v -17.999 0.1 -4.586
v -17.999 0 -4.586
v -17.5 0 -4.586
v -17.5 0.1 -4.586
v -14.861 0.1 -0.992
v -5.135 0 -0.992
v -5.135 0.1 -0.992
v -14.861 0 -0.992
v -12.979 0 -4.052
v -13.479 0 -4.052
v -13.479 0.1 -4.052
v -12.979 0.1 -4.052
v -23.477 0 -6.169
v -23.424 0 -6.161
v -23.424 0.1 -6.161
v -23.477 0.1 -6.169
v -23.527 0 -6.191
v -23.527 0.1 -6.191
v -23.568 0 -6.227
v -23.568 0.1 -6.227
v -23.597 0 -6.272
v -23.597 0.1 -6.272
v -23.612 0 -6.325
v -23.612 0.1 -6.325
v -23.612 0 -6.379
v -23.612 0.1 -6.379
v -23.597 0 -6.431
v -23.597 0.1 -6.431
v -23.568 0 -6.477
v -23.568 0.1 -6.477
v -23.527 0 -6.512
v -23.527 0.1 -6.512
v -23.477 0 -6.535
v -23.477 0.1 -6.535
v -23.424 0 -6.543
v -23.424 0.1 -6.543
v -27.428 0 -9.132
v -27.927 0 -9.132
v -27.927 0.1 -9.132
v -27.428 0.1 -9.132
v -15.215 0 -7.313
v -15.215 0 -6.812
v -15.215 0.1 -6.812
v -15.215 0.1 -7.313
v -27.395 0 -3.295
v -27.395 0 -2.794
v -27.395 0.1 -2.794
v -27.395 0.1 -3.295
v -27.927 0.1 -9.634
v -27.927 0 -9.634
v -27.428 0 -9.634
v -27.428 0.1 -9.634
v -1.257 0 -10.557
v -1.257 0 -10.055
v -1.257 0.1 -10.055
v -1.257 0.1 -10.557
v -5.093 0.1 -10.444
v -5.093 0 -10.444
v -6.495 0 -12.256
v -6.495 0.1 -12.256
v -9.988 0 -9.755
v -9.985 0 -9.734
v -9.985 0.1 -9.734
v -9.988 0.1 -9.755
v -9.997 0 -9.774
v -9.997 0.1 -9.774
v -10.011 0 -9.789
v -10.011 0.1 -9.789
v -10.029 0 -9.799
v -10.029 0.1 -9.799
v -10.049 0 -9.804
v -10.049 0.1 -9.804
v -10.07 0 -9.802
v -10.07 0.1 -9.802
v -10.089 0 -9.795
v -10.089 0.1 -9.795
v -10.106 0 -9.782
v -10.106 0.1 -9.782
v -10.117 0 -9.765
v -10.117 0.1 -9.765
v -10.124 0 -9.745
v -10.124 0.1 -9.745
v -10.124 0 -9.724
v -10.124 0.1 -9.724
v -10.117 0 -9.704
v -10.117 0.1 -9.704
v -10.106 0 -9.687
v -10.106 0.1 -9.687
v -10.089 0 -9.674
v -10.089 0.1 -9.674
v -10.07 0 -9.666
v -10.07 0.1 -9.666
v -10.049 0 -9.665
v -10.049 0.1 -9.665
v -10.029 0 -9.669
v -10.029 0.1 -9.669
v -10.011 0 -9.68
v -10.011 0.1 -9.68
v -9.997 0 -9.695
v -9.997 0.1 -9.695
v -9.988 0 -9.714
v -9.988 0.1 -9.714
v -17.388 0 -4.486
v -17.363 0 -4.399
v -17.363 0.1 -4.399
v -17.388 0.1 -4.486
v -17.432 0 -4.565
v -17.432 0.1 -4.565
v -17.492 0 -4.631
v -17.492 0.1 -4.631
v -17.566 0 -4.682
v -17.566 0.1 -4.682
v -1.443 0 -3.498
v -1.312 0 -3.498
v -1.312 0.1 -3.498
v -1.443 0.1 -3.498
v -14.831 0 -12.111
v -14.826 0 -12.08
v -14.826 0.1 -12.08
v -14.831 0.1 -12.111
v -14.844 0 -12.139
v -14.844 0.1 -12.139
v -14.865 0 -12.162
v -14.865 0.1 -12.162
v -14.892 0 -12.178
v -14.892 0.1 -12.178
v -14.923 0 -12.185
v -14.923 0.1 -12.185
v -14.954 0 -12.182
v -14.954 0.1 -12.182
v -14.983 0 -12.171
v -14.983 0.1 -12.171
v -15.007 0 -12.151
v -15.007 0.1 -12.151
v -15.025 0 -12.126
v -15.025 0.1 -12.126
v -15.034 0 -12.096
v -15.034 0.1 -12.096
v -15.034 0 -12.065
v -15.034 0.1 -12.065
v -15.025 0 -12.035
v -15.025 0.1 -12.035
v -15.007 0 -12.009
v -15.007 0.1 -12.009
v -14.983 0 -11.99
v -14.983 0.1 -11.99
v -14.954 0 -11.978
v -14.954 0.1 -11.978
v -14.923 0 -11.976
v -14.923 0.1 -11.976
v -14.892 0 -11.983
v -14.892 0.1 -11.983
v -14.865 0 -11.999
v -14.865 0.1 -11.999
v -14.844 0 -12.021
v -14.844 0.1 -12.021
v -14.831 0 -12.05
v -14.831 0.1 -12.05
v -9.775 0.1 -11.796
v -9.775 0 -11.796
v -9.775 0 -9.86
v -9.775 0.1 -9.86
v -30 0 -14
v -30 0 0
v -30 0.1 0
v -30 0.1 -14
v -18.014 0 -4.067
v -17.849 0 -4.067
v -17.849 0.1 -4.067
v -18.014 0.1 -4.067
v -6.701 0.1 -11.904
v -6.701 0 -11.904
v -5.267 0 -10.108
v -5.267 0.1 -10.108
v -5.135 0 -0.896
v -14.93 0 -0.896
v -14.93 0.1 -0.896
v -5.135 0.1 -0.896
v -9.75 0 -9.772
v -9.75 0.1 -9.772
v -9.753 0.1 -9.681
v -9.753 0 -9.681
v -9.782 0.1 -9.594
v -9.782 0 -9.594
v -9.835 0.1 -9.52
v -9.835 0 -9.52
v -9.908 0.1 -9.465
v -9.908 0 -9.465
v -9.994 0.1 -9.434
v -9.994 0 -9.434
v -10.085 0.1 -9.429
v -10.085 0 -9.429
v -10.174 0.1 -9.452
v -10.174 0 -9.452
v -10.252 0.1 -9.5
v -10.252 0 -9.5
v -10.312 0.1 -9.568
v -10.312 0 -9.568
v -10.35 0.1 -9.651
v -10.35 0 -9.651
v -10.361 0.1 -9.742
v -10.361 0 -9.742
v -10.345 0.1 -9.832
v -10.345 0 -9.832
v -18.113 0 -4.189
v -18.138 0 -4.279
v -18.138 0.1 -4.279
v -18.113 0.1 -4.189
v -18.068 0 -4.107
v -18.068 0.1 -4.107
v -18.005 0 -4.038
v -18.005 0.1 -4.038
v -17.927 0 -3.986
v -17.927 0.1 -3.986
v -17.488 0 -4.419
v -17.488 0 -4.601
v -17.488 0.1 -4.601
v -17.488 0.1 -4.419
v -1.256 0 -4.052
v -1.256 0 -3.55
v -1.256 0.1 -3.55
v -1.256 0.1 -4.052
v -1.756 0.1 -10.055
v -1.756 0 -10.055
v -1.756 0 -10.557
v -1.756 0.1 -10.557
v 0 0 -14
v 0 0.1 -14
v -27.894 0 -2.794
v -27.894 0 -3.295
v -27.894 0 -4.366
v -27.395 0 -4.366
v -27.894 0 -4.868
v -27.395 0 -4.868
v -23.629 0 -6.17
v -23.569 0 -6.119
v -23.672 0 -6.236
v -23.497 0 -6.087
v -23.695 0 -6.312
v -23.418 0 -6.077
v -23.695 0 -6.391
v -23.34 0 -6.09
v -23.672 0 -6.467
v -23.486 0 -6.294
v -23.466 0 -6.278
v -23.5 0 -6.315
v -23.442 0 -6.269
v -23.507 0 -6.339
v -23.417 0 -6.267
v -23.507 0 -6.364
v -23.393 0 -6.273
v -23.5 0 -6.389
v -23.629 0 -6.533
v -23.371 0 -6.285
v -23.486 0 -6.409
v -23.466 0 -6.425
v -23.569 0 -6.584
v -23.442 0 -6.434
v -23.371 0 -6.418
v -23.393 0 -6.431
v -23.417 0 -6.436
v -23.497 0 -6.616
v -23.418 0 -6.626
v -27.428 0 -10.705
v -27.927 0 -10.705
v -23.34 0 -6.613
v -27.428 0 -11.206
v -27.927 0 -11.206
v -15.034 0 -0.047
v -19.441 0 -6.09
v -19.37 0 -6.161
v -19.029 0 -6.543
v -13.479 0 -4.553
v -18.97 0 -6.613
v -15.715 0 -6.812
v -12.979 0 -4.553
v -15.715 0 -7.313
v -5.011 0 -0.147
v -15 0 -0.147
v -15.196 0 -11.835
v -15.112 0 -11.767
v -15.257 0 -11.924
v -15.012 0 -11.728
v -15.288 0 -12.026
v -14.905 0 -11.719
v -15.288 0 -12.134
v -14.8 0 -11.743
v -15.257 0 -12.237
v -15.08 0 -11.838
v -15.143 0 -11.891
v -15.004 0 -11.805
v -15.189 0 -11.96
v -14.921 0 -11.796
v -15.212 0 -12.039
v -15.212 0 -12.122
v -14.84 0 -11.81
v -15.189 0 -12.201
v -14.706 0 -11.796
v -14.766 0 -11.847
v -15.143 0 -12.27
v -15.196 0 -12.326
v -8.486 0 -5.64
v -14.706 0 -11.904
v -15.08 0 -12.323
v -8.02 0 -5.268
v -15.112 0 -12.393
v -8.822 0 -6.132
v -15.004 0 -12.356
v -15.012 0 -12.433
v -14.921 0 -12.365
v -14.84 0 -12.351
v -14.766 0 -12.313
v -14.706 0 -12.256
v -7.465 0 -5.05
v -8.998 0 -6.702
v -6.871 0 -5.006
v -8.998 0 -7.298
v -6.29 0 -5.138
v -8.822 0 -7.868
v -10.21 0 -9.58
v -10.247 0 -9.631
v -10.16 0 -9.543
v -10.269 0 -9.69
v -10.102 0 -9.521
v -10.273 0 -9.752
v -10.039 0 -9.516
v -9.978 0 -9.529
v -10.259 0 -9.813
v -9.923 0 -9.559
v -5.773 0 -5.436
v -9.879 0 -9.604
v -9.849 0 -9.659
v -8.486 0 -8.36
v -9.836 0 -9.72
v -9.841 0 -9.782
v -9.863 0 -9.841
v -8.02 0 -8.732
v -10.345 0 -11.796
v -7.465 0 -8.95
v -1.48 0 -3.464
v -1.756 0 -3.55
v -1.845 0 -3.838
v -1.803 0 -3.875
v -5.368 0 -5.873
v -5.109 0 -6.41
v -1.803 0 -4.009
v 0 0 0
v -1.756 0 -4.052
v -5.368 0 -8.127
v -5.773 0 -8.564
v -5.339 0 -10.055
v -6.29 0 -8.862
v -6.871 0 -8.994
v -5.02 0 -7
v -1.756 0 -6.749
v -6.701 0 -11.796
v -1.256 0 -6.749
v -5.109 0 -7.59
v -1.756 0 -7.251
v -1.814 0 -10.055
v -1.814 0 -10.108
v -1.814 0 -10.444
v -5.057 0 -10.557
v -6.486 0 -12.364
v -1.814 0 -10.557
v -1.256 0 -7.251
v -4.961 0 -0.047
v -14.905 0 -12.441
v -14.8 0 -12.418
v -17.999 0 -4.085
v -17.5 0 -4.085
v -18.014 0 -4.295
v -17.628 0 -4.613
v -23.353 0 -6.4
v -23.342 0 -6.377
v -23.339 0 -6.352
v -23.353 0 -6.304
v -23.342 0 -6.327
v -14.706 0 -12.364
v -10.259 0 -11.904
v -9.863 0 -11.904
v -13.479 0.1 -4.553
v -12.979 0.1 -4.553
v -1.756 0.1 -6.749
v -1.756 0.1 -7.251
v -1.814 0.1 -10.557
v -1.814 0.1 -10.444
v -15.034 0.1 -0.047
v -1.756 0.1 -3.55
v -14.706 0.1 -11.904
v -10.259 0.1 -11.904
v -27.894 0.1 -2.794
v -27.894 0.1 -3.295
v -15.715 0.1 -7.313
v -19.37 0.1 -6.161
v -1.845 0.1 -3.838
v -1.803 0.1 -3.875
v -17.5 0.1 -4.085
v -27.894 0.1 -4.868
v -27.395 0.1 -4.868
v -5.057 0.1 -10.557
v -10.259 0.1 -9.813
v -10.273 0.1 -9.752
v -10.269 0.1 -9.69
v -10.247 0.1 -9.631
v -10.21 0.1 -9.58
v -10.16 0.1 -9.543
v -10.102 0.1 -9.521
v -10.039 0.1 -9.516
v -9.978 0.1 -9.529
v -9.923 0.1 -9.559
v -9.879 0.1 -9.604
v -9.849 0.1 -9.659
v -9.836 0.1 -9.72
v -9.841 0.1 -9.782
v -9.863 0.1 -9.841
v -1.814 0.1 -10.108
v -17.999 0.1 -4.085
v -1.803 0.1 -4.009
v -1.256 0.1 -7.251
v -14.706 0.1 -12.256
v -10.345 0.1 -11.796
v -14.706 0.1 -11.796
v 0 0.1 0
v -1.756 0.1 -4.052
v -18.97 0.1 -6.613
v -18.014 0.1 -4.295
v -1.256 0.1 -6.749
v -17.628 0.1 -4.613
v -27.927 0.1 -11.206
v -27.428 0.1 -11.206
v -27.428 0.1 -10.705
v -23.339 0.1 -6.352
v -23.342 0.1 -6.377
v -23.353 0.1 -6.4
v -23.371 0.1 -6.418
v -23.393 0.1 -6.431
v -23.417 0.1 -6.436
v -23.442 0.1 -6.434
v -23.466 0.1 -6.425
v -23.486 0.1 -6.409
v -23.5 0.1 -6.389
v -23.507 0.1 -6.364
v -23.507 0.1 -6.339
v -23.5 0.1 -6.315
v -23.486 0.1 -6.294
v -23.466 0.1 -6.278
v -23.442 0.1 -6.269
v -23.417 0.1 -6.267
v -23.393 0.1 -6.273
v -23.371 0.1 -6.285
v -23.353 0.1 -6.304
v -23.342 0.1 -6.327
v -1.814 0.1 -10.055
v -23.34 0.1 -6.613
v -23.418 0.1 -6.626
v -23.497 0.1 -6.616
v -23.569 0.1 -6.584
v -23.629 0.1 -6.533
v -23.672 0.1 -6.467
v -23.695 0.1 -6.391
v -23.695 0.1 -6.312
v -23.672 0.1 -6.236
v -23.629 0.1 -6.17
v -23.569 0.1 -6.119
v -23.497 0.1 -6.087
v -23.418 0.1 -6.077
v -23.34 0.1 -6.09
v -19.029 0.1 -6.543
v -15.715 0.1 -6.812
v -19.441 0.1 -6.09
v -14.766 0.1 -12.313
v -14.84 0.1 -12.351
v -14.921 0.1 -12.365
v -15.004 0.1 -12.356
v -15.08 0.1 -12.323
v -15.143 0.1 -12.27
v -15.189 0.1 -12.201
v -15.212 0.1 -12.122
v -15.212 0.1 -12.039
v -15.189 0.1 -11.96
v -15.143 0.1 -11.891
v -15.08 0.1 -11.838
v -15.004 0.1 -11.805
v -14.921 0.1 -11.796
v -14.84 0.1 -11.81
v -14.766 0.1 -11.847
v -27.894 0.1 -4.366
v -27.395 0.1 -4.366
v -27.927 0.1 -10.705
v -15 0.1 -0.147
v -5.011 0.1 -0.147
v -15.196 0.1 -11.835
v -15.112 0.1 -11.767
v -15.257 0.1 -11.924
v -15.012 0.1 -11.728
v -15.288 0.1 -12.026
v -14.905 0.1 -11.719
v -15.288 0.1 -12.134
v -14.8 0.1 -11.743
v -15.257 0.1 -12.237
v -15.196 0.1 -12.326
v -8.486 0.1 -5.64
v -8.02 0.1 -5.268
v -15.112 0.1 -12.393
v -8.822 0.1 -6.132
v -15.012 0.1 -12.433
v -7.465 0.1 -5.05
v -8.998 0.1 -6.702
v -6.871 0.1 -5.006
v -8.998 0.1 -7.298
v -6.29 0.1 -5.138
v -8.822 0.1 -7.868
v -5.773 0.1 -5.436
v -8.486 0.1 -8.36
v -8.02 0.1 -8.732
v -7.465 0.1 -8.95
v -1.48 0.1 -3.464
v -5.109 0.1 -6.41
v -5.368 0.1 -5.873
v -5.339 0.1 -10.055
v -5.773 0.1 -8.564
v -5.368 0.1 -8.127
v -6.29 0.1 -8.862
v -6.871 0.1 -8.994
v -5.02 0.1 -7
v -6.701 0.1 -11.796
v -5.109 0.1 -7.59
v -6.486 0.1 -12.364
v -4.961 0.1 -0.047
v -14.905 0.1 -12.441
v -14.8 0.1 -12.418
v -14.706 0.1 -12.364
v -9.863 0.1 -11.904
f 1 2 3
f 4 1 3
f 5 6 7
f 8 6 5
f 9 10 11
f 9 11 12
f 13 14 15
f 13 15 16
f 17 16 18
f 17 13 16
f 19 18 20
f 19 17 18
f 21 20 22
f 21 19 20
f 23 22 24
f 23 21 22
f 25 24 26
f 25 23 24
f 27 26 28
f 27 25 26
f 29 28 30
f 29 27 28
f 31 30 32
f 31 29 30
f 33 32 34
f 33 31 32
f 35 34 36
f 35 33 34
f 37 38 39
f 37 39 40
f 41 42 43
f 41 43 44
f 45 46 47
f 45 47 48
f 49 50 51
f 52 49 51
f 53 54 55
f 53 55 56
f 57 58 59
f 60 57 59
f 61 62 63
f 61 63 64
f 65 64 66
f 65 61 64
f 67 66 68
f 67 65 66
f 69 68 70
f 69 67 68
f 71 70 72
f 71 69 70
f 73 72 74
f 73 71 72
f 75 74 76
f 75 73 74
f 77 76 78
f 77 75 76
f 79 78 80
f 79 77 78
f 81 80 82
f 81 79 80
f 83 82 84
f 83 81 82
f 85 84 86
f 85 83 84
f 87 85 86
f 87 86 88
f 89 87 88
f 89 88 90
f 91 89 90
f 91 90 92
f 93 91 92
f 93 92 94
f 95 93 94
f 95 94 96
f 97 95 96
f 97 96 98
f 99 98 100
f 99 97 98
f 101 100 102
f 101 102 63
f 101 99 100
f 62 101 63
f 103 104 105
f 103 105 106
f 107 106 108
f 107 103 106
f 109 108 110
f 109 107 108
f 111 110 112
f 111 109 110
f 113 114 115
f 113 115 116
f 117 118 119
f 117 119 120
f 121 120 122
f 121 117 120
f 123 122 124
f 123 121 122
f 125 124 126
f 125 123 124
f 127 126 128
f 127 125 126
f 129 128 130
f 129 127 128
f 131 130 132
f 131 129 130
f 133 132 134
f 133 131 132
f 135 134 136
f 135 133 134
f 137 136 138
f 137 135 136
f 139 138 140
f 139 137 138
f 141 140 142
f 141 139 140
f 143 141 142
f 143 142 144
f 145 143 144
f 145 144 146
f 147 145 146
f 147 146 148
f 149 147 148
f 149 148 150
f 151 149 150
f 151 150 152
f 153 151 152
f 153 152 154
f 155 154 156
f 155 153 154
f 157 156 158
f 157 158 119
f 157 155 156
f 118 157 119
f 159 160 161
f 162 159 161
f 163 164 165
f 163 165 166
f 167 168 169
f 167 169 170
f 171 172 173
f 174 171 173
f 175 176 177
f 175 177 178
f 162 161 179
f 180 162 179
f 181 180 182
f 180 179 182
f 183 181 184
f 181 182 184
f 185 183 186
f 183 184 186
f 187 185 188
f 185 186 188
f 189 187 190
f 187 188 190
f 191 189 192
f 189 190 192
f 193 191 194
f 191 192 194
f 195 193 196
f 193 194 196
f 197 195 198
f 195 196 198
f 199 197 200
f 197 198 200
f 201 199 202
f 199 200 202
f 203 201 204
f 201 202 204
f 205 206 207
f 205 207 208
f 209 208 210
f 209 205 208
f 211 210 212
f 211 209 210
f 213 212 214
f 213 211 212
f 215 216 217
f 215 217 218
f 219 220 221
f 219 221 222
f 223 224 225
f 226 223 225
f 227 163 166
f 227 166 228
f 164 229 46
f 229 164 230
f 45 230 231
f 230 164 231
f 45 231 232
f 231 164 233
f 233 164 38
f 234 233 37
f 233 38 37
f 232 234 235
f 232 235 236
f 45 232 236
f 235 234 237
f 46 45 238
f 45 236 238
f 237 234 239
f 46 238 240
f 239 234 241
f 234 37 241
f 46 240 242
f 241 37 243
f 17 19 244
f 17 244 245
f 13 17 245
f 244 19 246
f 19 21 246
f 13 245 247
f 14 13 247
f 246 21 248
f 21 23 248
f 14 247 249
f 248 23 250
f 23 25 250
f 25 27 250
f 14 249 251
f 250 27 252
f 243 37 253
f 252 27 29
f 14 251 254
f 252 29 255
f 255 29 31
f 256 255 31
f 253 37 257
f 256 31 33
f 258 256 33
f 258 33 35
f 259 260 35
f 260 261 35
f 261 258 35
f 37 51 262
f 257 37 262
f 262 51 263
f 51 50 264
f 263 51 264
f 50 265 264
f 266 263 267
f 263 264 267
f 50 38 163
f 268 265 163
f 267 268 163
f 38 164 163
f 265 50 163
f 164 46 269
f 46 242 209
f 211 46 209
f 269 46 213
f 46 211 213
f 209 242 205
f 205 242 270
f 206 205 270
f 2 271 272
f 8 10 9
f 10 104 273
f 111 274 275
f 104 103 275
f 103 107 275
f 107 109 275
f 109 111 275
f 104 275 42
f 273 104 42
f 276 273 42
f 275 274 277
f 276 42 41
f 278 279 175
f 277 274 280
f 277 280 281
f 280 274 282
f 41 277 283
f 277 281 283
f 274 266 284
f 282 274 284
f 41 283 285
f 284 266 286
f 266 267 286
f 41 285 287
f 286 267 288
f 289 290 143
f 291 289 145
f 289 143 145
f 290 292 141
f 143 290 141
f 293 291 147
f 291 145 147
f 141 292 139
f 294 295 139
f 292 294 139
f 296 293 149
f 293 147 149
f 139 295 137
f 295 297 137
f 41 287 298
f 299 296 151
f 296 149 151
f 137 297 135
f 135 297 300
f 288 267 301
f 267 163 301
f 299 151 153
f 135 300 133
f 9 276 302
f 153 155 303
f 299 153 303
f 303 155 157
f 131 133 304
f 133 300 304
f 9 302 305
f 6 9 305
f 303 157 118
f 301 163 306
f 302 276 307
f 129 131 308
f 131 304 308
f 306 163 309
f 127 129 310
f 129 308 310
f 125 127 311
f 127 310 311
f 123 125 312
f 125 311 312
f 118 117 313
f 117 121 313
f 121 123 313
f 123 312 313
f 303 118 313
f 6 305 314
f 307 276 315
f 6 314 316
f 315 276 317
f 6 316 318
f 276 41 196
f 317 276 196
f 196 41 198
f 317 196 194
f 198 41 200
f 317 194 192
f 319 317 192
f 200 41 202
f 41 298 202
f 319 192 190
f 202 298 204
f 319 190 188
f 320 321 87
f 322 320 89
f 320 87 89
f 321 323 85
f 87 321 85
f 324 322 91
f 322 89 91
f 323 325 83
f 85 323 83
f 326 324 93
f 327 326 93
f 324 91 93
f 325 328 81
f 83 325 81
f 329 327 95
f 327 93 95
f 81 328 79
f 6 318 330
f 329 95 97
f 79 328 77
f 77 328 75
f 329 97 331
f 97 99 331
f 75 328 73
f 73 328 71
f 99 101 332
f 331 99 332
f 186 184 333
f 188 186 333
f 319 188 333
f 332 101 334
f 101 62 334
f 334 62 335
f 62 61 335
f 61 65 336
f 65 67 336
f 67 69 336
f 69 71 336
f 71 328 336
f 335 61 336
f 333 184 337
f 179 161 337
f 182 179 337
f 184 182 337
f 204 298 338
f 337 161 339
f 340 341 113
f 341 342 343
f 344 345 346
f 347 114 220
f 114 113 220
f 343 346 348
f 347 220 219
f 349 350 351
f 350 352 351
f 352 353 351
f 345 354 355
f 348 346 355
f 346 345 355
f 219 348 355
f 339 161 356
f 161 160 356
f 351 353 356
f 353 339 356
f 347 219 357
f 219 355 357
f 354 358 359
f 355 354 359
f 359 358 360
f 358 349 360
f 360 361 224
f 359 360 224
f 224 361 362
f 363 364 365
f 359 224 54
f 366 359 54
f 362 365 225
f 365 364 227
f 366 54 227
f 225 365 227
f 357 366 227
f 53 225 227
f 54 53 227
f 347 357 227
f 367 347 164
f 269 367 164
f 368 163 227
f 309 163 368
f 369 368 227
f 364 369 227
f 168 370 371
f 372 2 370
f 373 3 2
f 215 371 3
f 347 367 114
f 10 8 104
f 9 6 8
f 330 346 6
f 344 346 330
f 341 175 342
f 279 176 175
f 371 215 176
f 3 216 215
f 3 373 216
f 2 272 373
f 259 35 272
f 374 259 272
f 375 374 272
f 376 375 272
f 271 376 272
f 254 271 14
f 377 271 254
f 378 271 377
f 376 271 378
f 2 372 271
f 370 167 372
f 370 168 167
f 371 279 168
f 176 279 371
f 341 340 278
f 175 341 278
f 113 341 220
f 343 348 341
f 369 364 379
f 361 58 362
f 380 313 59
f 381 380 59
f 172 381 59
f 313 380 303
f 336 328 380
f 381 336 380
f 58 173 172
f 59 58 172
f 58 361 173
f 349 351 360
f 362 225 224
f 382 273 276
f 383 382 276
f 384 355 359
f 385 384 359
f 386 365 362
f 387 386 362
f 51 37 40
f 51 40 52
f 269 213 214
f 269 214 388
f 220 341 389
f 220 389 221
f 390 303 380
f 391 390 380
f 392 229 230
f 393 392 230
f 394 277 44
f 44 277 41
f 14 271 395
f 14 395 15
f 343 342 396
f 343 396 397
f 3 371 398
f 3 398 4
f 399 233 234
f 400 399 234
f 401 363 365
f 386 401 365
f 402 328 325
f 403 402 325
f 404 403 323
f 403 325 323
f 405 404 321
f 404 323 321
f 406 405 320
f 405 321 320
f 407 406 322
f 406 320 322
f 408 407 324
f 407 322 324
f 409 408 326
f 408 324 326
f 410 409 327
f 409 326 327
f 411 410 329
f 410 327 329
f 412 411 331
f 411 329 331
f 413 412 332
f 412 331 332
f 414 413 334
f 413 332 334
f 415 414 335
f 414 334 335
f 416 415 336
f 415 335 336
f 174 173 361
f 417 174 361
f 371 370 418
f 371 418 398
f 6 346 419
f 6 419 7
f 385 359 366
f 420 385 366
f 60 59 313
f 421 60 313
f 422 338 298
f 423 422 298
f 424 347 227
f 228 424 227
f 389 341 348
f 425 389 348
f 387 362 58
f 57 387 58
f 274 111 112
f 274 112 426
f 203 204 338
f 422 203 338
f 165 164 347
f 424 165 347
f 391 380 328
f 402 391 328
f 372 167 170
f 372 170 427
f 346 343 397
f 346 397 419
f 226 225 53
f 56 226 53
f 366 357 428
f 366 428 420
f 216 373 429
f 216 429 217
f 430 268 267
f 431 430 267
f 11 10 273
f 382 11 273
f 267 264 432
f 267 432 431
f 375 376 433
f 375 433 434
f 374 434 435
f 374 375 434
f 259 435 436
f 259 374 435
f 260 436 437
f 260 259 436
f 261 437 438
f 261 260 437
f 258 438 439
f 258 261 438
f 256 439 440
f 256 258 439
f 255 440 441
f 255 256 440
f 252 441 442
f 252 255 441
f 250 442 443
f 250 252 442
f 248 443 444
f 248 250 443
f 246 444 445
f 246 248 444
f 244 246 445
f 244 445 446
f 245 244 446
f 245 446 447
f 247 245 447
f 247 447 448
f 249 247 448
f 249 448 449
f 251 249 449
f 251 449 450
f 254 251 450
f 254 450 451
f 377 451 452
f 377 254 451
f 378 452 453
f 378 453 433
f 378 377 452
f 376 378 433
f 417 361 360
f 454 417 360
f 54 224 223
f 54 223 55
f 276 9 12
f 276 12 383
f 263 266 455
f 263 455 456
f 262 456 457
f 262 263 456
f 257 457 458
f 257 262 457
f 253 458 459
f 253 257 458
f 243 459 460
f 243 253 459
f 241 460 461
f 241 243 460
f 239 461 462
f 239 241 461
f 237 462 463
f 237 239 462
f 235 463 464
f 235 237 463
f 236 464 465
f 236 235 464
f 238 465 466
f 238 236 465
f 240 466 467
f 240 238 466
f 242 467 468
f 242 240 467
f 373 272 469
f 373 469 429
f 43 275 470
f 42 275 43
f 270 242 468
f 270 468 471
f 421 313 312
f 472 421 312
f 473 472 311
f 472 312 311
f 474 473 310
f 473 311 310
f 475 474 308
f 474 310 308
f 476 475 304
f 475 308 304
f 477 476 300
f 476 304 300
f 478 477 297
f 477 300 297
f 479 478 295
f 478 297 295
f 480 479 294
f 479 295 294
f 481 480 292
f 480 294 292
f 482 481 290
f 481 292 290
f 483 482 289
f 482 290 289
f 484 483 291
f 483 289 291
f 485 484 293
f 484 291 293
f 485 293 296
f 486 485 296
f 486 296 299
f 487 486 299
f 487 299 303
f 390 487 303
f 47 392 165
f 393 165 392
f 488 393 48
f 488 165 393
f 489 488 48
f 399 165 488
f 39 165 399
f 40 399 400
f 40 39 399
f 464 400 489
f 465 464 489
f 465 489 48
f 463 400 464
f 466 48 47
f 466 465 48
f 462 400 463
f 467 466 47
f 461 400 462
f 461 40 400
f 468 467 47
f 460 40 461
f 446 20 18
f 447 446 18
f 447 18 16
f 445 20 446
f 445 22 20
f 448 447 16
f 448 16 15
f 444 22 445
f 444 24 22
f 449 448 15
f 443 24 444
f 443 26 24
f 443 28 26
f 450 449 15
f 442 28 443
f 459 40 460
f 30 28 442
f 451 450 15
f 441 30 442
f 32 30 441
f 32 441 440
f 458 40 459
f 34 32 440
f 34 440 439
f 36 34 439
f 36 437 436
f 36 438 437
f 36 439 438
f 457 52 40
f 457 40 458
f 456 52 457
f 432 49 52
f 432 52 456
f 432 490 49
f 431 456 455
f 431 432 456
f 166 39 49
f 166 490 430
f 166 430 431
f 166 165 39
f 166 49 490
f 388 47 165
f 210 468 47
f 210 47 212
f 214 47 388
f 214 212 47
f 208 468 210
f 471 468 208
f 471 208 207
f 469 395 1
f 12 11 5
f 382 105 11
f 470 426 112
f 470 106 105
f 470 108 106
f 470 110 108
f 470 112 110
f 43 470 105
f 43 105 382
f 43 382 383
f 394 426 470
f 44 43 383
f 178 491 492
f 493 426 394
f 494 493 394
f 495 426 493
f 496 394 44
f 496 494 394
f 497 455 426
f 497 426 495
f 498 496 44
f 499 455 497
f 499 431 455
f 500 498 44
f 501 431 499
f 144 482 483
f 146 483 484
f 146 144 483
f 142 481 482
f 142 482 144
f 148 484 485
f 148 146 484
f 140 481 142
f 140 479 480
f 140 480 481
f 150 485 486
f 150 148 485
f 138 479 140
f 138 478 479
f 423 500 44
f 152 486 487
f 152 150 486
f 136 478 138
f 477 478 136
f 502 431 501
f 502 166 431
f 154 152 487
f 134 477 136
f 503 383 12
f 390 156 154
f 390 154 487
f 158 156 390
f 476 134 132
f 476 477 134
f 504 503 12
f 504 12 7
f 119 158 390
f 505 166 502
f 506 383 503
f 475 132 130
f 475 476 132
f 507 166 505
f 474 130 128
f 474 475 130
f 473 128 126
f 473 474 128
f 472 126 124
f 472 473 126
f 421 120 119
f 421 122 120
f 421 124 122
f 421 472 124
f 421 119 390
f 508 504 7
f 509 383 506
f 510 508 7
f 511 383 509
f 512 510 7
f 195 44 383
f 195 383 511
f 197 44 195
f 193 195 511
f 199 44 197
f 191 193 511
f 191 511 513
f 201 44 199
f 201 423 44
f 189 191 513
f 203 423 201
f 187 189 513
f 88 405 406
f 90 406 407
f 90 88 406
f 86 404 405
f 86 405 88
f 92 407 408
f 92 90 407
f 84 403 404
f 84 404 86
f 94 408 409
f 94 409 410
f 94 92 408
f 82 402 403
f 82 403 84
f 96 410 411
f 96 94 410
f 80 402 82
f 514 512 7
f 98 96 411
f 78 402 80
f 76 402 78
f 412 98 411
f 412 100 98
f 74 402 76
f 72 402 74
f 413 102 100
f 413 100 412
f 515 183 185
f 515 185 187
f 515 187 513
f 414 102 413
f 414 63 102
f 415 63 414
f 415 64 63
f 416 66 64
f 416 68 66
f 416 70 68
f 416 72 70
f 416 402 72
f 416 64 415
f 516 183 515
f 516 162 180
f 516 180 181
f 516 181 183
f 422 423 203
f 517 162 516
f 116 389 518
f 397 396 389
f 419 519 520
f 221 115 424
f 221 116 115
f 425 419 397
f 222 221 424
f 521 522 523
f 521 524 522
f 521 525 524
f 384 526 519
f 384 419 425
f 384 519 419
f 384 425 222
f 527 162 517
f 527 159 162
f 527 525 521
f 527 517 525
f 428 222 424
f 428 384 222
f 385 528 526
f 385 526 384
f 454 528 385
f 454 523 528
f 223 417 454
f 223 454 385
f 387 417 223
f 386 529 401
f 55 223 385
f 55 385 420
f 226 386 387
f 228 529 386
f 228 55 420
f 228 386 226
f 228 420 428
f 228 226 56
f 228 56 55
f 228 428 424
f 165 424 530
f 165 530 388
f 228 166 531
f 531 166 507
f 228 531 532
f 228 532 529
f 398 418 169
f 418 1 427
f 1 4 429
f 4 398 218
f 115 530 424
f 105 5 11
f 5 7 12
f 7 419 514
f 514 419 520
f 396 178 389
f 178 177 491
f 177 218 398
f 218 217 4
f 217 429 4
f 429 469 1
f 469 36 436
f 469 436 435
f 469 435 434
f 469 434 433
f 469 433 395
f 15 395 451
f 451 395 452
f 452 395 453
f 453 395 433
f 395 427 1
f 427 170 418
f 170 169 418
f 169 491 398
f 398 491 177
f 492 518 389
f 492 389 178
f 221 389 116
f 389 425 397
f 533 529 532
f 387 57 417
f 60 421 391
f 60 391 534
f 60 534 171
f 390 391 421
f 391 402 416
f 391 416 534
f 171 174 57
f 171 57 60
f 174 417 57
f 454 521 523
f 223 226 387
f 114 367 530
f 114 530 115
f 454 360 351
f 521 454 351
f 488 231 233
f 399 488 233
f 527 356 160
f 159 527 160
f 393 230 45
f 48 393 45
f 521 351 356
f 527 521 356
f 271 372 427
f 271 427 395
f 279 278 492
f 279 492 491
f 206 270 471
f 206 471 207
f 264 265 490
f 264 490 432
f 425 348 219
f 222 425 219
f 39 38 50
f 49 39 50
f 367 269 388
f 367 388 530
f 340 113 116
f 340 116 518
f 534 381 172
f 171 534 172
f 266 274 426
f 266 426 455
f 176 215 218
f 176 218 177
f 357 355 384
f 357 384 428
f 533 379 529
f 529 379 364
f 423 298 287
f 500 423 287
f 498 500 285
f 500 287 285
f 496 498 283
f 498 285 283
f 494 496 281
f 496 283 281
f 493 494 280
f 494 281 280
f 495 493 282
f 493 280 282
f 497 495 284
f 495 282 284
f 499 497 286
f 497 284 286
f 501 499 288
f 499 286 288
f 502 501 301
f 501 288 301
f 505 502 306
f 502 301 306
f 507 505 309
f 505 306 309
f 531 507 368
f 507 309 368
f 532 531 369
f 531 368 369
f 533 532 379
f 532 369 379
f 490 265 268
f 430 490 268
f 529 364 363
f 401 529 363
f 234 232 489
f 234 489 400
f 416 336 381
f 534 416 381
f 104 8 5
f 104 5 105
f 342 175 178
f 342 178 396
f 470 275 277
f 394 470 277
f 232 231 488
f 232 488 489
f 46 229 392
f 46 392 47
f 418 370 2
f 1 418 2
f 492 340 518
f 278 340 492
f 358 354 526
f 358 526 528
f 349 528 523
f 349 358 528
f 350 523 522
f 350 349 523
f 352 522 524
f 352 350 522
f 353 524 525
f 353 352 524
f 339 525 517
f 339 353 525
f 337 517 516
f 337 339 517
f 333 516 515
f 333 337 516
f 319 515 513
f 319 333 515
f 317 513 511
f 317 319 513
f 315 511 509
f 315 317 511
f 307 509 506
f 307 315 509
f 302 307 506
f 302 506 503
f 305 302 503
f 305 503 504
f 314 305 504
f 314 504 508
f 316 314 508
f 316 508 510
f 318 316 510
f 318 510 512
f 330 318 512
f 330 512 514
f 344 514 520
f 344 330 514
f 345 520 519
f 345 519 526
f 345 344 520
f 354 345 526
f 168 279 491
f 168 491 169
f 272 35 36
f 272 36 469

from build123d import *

# Parameters (mm, degrees)
SKETCH1_W           = 30
SKETCH1_H           = 14
SKETCH1_R           = 2
SKETCH1_R_2         = 0.069707308
SKETCH1_R_3         = 0.104510519
SKETCH1_R_4         = 0.084887638
SKETCH1_W_2         = 0.499197809
SKETCH1_H_2         = 0.501456342
SKETCH1_H_3         = 0.501456343
BOSS_EXTRUDE2_DEPTH = 0.1


with BuildPart() as part:
    # Sketch1 → Boss-Extrude2 (new body)
    with BuildSketch(Plane(origin=(0, 0, 0), x_dir=(1, 0, 0), z_dir=(0, 1, 0))):
        with Locations((-15, 7)):
            Rectangle(SKETCH1_W, SKETCH1_H)
        with Locations((-7.020370045, 7)):
            Circle(SKETCH1_R, mode=Mode.SUBTRACT)
        with Locations((-10.054598749, 9.734280097)):
            Circle(SKETCH1_R_2, mode=Mode.SUBTRACT)
        with Locations((-14.930479438, 12.0803142)):
            Circle(SKETCH1_R_3, mode=Mode.SUBTRACT)
        with Locations((-23.42355671, 6.351698017)):
            Circle(SKETCH1_R_4, mode=Mode.SUBTRACT)
        with Locations((-1.506295526, 10.305773891)):
            Rectangle(SKETCH1_W_2, SKETCH1_H_2, mode=Mode.SUBTRACT)
        with Locations((-1.506058557, 7)):
            Rectangle(SKETCH1_W_2, SKETCH1_H_2, mode=Mode.SUBTRACT)
        with BuildLine():
            Line((-4.96101097, 0.046964473), (-1.31173915, 3.49819904))
            Line((-1.31173915, 3.49819904), (-1.443001106, 3.49819904))
            Line((-1.443001106, 3.49819904), (-1.479787132, 3.463649644))
            Line((-1.479787132, 3.463649644), (-5.010670338, 0.147447917))
            Line((-5.010670338, 0.147447917), (-15, 0.147447917))
            Line((-15, 0.147447917), (-17.848796521, 4.06726876))
            Line((-17.848796521, 4.06726876), (-18.014319727, 4.06726876))
            Line((-18.014319727, 4.06726876), (-18.014319727, 4.295021535))
            Line((-18.014319727, 4.295021535), (-19.370357537, 6.160870932))
            Line((-19.370357537, 6.160870932), (-23.42355671, 6.160870932))
            ThreePointArc((-23.42355671, 6.160870932), (-23.614383795, 6.351698017), (-23.42355671, 6.542525102))
            Line((-23.42355671, 6.542525102), (-19.029181473, 6.542525102))
            Line((-19.029181473, 6.542525102), (-17.62839076, 4.612798563))
            Line((-17.62839076, 4.612798563), (-17.487814555, 4.60080418))
            Line((-17.487814555, 4.60080418), (-17.487814555, 4.419141059))
            Line((-17.487814555, 4.419141059), (-14.930479438, 0.896161218))
            Line((-14.930479438, 0.896161218), (-5.135127124, 0.896161218))
            Line((-5.135127124, 0.896161218), (-1.84502254, 3.838045622))
            Line((-1.84502254, 3.838045622), (-1.803361628, 3.8752972))
            Line((-1.803361628, 3.8752972), (-1.803361628, 4.008739354))
            Line((-1.803361628, 4.008739354), (-5.135127124, 0.991932607))
            Line((-5.135127124, 0.991932607), (-14.860958876, 0.991932607))
            Line((-14.860958876, 0.991932607), (-17.363055734, 4.399391562))
            ThreePointArc((-17.363055734, 4.399391562), (-17.431650559, 4.564517202), (-17.566438216, 4.682007688))
            Line((-17.566438216, 4.682007688), (-18.970202274, 6.613029158))
            Line((-18.970202274, 6.613029158), (-23.340033791, 6.613029158))
            ThreePointArc((-23.340033791, 6.613029158), (-23.697910575, 6.351698017), (-23.340033791, 6.090366876))
            Line((-23.340033791, 6.090366876), (-19.441304426, 6.090366876))
            Line((-19.441304426, 6.090366876), (-18.137822853, 4.279075615))
            ThreePointArc((-18.137822853, 4.279075615), (-18.068074192, 4.106519917), (-17.926607711, 3.985575386))
            Line((-17.926607711, 3.985575386), (-15.034486009, 0.046964473))
            Line((-15.034486009, 0.046964473), (-4.96101097, 0.046964473))
        make_face(mode=Mode.SUBTRACT)
        with Locations((-1.506084597, 3.801182197)):
            Rectangle(SKETCH1_W_2, SKETCH1_H_2, mode=Mode.SUBTRACT)
        with BuildLine():
            Line((-7.144578994, 12.364310321), (-6.486189519, 12.364310321))
            Line((-6.486189519, 12.364310321), (-5.05686536, 10.556502062))
            Line((-5.05686536, 10.556502062), (-1.814229317, 10.556502062))
            Line((-1.814229317, 10.556502062), (-1.814229317, 10.443944973))
            Line((-1.814229317, 10.443944973), (-5.093427141, 10.443944973))
            Line((-5.093427141, 10.443944973), (-6.494858626, 12.256144774))
            Line((-6.494858626, 12.256144774), (-14.706243657, 12.256144774))
            ThreePointArc((-14.706243657, 12.256144774), (-15.215432199, 12.0803142), (-14.706243657, 11.904483626))
            Line((-14.706243657, 11.904483626), (-10.258741579, 11.904483626))
            Line((-10.258741579, 11.904483626), (-10.258741579, 9.812957143))
            ThreePointArc((-10.258741579, 9.812957143), (-10.03937832, 9.516030903), (-9.863352573, 9.840531084))
            Line((-9.863352573, 9.840531084), (-9.863352573, 11.904483626))
            Line((-9.863352573, 11.904483626), (-6.700536123, 11.904483626))
            Line((-6.700536123, 11.904483626), (-5.266623049, 10.107938883))
            Line((-5.266623049, 10.107938883), (-1.814229317, 10.107938883))
            Line((-1.814229317, 10.107938883), (-1.814229317, 10.05504572))
            Line((-1.814229317, 10.05504572), (-5.339250668, 10.05504572))
            Line((-5.339250668, 10.05504572), (-6.700536123, 11.796318079))
            Line((-6.700536123, 11.796318079), (-9.774961406, 11.796318079))
            Line((-9.774961406, 11.796318079), (-9.774961406, 9.860139301))
            ThreePointArc((-9.774961406, 9.860139301), (-10.039576048, 9.427992811), (-10.345210476, 9.83216987))
            Line((-10.345210476, 9.83216987), (-10.345210476, 11.796318079))
            Line((-10.345210476, 11.796318079), (-14.706243657, 11.796318079))
            ThreePointArc((-14.706243657, 11.796318079), (-15.29232952, 12.0803142), (-14.706243657, 12.364310321))
            Line((-14.706243657, 12.364310321), (-7.144578994, 12.364310321))
        make_face(mode=Mode.SUBTRACT)
        with Locations((-17.749862376, 4.33551856)):
            Rectangle(SKETCH1_W_2, SKETCH1_H_3, mode=Mode.SUBTRACT)
        with Locations((-13.229055218, 4.302374896)):
            Rectangle(SKETCH1_W_2, SKETCH1_H_2, mode=Mode.SUBTRACT)
        with Locations((-15.465031103, 7.062725803)):
            Rectangle(SKETCH1_W_2, SKETCH1_H_2, mode=Mode.SUBTRACT)
        with Locations((-27.644321584, 3.044426332)):
            Rectangle(SKETCH1_W_2, SKETCH1_H_3, mode=Mode.SUBTRACT)
        with Locations((-27.644321584, 4.617052121)):
            Rectangle(SKETCH1_W_2, SKETCH1_H_2, mode=Mode.SUBTRACT)
        with Locations((-27.677861275, 9.382947879)):
            Rectangle(SKETCH1_W_2, SKETCH1_H_2, mode=Mode.SUBTRACT)
        with Locations((-27.677861275, 10.955573669)):
            Rectangle(SKETCH1_W_2, SKETCH1_H_3, mode=Mode.SUBTRACT)
    extrude(amount=BOSS_EXTRUDE2_DEPTH)


solid = part.part
